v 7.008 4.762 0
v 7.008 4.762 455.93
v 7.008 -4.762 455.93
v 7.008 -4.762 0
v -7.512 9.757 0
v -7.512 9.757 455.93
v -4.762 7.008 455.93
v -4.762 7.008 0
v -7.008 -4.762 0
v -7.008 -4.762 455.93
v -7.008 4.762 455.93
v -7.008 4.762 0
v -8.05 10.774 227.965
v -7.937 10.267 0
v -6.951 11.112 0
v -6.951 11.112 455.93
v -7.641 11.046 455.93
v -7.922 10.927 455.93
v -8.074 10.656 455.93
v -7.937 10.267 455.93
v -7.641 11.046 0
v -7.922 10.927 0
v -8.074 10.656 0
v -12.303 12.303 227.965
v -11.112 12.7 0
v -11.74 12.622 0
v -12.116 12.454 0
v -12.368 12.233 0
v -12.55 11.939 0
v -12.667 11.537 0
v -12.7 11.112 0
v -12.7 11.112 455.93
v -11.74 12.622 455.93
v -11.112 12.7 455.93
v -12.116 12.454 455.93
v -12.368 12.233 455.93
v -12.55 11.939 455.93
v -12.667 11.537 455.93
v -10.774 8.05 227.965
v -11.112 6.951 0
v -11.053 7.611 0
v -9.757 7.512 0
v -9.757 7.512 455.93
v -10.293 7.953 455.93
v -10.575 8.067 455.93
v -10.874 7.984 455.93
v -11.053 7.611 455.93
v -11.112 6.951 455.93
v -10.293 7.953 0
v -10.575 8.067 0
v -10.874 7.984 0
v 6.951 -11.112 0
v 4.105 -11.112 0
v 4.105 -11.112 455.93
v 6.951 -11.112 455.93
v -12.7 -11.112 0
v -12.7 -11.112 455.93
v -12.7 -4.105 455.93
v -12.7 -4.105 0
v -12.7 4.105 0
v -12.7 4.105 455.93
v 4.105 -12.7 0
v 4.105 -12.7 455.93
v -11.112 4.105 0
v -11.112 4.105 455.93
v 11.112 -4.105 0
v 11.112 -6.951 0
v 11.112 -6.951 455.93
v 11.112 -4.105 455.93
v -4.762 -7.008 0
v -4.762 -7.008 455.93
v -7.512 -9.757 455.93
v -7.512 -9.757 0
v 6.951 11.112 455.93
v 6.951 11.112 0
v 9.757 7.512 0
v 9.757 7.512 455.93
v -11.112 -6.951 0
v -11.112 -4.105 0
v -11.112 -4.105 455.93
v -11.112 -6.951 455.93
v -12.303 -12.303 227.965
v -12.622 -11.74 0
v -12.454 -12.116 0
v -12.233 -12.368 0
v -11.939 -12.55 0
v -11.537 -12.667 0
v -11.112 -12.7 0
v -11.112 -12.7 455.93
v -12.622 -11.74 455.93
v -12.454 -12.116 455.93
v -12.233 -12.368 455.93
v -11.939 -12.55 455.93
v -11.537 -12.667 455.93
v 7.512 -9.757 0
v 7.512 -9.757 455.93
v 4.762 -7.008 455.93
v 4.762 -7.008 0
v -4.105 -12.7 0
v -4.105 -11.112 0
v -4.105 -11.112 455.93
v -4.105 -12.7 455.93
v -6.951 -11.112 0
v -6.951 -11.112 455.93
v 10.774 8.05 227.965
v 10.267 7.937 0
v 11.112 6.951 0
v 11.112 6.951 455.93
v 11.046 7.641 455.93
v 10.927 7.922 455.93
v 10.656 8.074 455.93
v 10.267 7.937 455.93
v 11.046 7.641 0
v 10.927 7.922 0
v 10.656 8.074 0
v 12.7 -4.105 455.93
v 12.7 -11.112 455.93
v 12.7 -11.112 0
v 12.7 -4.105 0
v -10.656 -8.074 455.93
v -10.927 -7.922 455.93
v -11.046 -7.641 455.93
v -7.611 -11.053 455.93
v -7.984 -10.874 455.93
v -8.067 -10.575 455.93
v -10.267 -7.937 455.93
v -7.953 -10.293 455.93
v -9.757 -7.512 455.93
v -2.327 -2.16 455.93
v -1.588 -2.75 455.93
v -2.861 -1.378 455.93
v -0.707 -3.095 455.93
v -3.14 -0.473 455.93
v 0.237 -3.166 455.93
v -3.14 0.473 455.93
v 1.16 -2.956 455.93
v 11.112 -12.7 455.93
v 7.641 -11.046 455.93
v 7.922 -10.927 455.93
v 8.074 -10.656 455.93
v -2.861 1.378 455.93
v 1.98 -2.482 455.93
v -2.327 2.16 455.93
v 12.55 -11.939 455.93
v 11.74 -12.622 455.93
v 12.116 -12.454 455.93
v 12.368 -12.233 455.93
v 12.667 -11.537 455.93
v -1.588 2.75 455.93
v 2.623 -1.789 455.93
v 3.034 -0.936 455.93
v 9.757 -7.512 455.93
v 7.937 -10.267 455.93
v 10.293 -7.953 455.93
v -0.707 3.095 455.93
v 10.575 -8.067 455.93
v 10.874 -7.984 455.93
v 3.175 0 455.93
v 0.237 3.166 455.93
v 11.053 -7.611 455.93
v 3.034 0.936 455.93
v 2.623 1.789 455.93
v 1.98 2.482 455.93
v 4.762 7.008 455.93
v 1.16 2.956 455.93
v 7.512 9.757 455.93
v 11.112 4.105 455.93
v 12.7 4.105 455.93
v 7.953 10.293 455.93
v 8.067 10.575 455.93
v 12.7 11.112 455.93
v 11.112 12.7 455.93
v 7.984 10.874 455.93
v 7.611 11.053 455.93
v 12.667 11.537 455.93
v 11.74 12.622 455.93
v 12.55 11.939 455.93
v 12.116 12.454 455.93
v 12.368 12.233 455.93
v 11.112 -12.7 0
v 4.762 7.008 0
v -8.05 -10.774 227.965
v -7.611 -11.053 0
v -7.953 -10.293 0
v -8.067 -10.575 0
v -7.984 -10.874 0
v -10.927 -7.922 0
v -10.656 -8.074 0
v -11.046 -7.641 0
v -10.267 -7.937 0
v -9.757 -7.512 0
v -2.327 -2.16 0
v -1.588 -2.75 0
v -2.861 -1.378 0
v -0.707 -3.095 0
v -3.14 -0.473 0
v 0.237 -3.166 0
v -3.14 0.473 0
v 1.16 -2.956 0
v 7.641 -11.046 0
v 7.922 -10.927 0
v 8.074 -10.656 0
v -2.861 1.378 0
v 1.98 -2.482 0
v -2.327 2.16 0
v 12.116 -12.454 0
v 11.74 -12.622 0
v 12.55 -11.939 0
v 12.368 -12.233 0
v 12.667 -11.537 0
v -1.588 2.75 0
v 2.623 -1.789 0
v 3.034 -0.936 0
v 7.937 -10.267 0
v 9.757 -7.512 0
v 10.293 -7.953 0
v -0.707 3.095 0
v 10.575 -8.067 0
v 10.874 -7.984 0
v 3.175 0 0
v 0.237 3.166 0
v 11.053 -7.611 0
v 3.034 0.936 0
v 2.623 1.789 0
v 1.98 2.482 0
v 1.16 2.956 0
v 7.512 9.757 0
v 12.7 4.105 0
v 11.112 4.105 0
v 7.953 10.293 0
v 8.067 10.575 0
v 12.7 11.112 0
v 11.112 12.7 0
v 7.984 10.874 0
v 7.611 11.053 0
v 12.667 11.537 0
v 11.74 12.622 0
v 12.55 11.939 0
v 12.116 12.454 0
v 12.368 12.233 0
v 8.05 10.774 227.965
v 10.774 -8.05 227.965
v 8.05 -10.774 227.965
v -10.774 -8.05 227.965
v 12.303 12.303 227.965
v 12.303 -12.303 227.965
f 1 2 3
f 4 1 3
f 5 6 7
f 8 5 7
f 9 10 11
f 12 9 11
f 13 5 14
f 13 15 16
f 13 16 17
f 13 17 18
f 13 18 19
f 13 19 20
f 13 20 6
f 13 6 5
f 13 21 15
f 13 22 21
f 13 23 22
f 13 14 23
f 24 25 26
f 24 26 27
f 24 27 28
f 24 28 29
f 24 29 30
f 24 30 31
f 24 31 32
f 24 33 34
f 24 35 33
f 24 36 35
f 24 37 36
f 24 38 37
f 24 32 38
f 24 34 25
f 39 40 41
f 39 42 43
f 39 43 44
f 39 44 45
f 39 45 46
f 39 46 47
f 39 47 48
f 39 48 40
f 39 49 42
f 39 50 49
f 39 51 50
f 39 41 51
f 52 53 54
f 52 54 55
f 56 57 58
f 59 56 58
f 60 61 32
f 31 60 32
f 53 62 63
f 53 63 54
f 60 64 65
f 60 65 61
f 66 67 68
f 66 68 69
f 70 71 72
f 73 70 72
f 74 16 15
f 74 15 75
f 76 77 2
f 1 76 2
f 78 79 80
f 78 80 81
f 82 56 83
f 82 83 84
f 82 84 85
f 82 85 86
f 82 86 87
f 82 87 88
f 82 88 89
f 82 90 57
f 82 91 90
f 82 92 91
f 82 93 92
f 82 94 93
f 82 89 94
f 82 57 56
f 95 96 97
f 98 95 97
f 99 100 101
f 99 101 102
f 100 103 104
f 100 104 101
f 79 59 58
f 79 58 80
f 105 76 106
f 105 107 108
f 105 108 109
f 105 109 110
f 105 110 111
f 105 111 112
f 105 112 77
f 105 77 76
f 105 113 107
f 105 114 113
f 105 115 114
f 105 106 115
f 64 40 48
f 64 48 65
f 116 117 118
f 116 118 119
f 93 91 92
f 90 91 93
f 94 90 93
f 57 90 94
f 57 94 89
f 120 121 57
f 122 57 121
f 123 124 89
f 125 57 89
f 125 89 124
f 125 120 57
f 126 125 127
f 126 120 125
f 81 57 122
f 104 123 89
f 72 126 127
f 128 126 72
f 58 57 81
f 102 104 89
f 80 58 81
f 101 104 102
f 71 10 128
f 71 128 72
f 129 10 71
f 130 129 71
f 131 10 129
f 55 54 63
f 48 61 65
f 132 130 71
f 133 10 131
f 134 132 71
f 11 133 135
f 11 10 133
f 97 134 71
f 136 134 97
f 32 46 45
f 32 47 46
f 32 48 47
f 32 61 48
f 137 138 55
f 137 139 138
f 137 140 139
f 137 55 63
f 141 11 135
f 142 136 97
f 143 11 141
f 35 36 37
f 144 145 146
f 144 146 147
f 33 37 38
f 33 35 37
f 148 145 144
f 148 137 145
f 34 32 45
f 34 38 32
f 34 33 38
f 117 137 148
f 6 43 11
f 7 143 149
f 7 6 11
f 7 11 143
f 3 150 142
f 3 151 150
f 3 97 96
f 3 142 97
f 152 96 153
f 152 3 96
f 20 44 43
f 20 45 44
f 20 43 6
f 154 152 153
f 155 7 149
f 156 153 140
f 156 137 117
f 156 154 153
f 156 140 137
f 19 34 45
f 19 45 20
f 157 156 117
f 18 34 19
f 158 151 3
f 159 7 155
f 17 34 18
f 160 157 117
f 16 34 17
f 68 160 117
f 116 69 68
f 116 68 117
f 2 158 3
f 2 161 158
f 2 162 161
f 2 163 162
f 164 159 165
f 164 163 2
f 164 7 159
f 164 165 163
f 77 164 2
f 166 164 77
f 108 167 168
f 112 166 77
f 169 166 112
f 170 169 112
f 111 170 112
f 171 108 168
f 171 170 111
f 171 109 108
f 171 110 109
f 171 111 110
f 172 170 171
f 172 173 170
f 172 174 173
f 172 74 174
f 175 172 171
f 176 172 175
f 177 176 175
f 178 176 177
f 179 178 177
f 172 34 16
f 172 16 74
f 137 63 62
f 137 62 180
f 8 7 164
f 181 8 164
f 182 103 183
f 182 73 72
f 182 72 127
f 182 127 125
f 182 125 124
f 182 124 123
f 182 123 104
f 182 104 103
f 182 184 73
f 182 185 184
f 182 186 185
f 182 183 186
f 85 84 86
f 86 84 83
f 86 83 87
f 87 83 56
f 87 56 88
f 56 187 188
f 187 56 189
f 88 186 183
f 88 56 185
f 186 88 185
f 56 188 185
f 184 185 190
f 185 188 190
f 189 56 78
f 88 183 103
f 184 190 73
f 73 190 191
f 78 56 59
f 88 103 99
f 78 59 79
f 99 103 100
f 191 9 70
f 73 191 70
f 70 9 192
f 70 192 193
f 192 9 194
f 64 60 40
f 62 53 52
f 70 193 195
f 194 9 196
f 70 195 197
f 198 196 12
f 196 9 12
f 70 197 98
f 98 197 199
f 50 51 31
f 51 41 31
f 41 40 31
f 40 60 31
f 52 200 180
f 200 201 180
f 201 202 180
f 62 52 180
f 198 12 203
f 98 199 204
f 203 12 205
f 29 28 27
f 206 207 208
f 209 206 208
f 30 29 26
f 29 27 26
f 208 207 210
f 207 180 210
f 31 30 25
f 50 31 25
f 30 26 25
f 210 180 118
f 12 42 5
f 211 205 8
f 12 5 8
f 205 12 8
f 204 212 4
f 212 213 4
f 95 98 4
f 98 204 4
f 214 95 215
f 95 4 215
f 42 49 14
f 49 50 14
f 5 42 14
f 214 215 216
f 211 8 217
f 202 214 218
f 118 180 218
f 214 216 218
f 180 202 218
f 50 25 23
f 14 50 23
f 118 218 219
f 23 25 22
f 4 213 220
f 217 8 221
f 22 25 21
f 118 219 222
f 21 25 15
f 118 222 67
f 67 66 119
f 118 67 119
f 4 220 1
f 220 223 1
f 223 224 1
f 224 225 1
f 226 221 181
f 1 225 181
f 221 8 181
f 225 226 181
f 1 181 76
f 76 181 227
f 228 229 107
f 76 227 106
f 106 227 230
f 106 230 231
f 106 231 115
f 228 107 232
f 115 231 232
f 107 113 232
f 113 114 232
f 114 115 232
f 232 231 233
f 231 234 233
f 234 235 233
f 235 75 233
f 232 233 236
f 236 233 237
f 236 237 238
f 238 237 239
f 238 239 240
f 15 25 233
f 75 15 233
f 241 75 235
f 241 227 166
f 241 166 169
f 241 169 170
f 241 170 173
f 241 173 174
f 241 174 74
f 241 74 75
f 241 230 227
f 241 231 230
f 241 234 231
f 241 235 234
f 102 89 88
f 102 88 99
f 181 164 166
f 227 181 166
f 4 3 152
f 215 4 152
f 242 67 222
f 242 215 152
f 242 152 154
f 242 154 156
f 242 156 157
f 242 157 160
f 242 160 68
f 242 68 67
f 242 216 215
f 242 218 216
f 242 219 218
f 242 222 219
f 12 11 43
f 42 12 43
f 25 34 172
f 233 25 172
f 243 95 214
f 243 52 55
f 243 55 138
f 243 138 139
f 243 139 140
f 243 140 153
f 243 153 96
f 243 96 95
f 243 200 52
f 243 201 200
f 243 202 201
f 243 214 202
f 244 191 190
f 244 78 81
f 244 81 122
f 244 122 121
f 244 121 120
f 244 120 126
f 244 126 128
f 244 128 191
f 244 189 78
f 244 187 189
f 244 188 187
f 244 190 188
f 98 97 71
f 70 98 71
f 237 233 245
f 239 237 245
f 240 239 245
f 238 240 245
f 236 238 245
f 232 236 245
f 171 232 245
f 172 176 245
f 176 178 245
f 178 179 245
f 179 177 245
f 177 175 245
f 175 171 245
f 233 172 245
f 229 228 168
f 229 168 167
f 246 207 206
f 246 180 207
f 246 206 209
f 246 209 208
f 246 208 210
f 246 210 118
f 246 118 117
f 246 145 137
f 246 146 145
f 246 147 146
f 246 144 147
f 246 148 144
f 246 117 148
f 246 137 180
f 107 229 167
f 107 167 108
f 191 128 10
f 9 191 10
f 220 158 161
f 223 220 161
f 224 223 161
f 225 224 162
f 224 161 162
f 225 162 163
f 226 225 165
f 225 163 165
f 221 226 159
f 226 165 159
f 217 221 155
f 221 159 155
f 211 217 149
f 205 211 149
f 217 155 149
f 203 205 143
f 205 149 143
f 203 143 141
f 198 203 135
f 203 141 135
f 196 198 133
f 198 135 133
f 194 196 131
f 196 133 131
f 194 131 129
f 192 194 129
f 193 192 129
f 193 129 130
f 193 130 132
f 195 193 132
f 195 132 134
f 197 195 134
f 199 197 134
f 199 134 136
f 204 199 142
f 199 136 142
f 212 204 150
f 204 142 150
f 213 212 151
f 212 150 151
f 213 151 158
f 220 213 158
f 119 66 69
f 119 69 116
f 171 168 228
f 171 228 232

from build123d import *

# Parameters (mm, degrees)
F0_W        = 25.4
F0_H        = 25.4
F1_DEPTH    = 455.93
F3_DEPTH    = 455.93
F4_R        = 3.175
F5_DEPTH    = 455.93
F6_T1_DEPTH = 463.8675
F7_T1_DEPTH = 455.93
F8_W        = 8.2098719395
F8_H        = 1.5875
F9_DEPTH    = 455.93


# Not quite as in the source:
# - a fillet or chamfer that OpenCascade refuses, or shapes differently, is made with other operations: its cross-section is extruded or revolved along the edge and cut away or added


with BuildPart() as f1:
    # F0 (on Top) → F1 (new body)
    with BuildSketch(Plane.XY):
        Rectangle(F0_W, F0_H)
    extrude(amount=F1_DEPTH)

    # F2 (on face) → F3 (cut)
    with BuildSketch(Plane.XY.offset(455.93)):
        Polygon((-7.0075640303, -4.7625), (-7.0075640303, 4.7625), (-11.1125, 8.8674359697), (-11.1125, 4.1049359697), (-12.7, 4.1049359697), (-12.7, -4.1049359697), (-11.1125, -4.1049359697), (-11.1125, -8.8674359697), align=None)
        Polygon((4.1049359697, 12.7), (-4.1049359697, 12.7), (-4.1049359697, 11.1125), (-8.8674359697, 11.1125), (-4.7625, 7.0075640303), (4.7625, 7.0075640303), (8.8674359697, 11.1125), (4.1049359697, 11.1125), align=None)
        Polygon((12.7, -4.1049359697), (12.7, 4.1049359697), (11.1125, 4.1049359697), (11.1125, 8.8674359697), (7.0075640303, 4.7625), (7.0075640303, -4.7625), (11.1125, -8.8674359697), (11.1125, -4.1049359697), align=None)
        Polygon((-4.1049359697, -11.1125), (-4.1049359697, -12.7), (4.1049359697, -12.7), (4.1049359697, -11.1125), (8.8674359697, -11.1125), (4.7625, -7.0075640303), (-4.7625, -7.0075640303), (-8.8674359697, -11.1125), align=None)
    extrude(amount=-F3_DEPTH, mode=Mode.SUBTRACT)

    # F4 (on face) → F5 (cut)
    with BuildSketch(Plane.XY.offset(455.93)):
        Circle(F4_R)
    extrude(amount=-F5_DEPTH, mode=Mode.SUBTRACT)

    # F6: fillet of radius 1.5875 on 4 edges, made by hand

    # F6_s2 → F6_t1 (cut)
    with BuildSketch(Plane.XY.offset(-3.96875)):
        with BuildLine():
            add(Edge.make_bspline(
                [(-12.7, 11.1125), (-12.7, 12.7), (-11.1125, 12.7)],
                knots=[0, 0, 0, 1, 1, 1], degree=2, weights=[1, 1, 1]))
            Line((-11.1125, 12.7), (-12.7, 12.7))
            Line((-12.7, 12.7), (-12.7, 11.1125))
        make_face()
        with BuildLine():
            add(Edge.make_bspline(
                [(12.7, 11.1125), (12.7, 12.7), (11.1125, 12.7)],
                knots=[0, 0, 0, 1, 1, 1], degree=2, weights=[1, 1, 1]))
            Line((11.1125, 12.7), (12.7, 12.7))
            Line((12.7, 12.7), (12.7, 11.1125))
        make_face()
        with BuildLine():
            add(Edge.make_bspline(
                [(12.7, -11.1125), (12.7, -12.7), (11.1125, -12.7)],
                knots=[0, 0, 0, 1, 1, 1], degree=2, weights=[1, 1, 1]))
            Line((11.1125, -12.7), (12.7, -12.7))
            Line((12.7, -12.7), (12.7, -11.1125))
        make_face()
        with BuildLine():
            add(Edge.make_bspline(
                [(-11.1125, -12.7), (-12.7, -12.7), (-12.7, -11.1125)],
                knots=[0, 0, 0, 1, 1, 1], degree=2, weights=[1, 1, 1]))
            Line((-12.7, -11.1125), (-12.7, -12.7))
            Line((-12.7, -12.7), (-11.1125, -12.7))
        make_face()
    extrude(amount=F6_T1_DEPTH, mode=Mode.SUBTRACT)

    # F7: fillet of radius 0.79375 on 8 edges, made by hand

    # F7_s2 → F7_t1 (join)
    with BuildSketch(Plane.XY):
        with BuildLine():
            add(Edge.make_bspline(
                [(-9.7574839924, 7.5124199622), (-11.1125, 8.8674359697), (-11.1125, 6.9511539546)],
                knots=[0, 0, 0, 1, 1, 1], degree=2, weights=[1, 1, 1]))
            Line((-11.1125, 6.9511539546), (-11.1125, 8.8674359697))
            Line((-11.1125, 8.8674359697), (-9.7574839924, 7.5124199622))
        make_face()
        with BuildLine():
            add(Edge.make_bspline(
                [(11.1125, 6.9511539546), (11.1125, 8.8674359697), (9.7574839924, 7.5124199622)],
                knots=[0, 0, 0, 1, 1, 1], degree=2, weights=[1, 1, 1]))
            Line((9.7574839924, 7.5124199622), (11.1125, 8.8674359697))
            Line((11.1125, 8.8674359697), (11.1125, 6.9511539546))
        make_face()
        with BuildLine():
            add(Edge.make_bspline(
                [(9.7574839924, -7.5124199622), (11.1125, -8.8674359697), (11.1125, -6.9511539546)],
                knots=[0, 0, 0, 1, 1, 1], degree=2, weights=[1, 1, 1]))
            Line((11.1125, -6.9511539546), (11.1125, -8.8674359697))
            Line((11.1125, -8.8674359697), (9.7574839924, -7.5124199622))
        make_face()
        with BuildLine():
            add(Edge.make_bspline(
                [(-11.1125, -6.9511539546), (-11.1125, -8.8674359697), (-9.7574839924, -7.5124199622)],
                knots=[0, 0, 0, 1, 1, 1], degree=2, weights=[1, 1, 1]))
            Line((-9.7574839924, -7.5124199622), (-11.1125, -8.8674359697))
            Line((-11.1125, -8.8674359697), (-11.1125, -6.9511539546))
        make_face()
        with BuildLine():
            add(Edge.make_bspline(
                [(-7.5124199622, -9.7574839924), (-8.8674359697, -11.1125), (-6.9511539546, -11.1125)],
                knots=[0, 0, 0, 1, 1, 1], degree=2, weights=[1, 1, 1]))
            Line((-6.9511539546, -11.1125), (-8.8674359697, -11.1125))
            Line((-8.8674359697, -11.1125), (-7.5124199622, -9.7574839924))
        make_face()
        with BuildLine():
            add(Edge.make_bspline(
                [(6.9511539546, -11.1125), (8.8674359697, -11.1125), (7.5124199622, -9.7574839924)],
                knots=[0, 0, 0, 1, 1, 1], degree=2, weights=[1, 1, 1]))
            Line((7.5124199622, -9.7574839924), (8.8674359697, -11.1125))
            Line((8.8674359697, -11.1125), (6.9511539546, -11.1125))
        make_face()
        with BuildLine():
            add(Edge.make_bspline(
                [(7.5124199622, 9.7574839924), (8.8674359697, 11.1125), (6.9511539546, 11.1125)],
                knots=[0, 0, 0, 1, 1, 1], degree=2, weights=[1, 1, 1]))
            Line((6.9511539546, 11.1125), (8.8674359697, 11.1125))
            Line((8.8674359697, 11.1125), (7.5124199622, 9.7574839924))
        make_face()
        with BuildLine():
            add(Edge.make_bspline(
                [(-6.9511539546, 11.1125), (-8.8674359697, 11.1125), (-7.5124199622, 9.7574839924)],
                knots=[0, 0, 0, 1, 1, 1], degree=2, weights=[1, 1, 1]))
            Line((-7.5124199622, 9.7574839924), (-8.8674359697, 11.1125))
            Line((-8.8674359697, 11.1125), (-6.9511539546, 11.1125))
        make_face()
    extrude(amount=F7_T1_DEPTH)

    # F8 (on face) → F9 (join)
    with BuildSketch(Plane.XY.offset(455.93)):
        with Locations((0, 11.90625)):
            Rectangle(F8_W, F8_H)
    extrude(amount=-F9_DEPTH)


solid = f1.part
